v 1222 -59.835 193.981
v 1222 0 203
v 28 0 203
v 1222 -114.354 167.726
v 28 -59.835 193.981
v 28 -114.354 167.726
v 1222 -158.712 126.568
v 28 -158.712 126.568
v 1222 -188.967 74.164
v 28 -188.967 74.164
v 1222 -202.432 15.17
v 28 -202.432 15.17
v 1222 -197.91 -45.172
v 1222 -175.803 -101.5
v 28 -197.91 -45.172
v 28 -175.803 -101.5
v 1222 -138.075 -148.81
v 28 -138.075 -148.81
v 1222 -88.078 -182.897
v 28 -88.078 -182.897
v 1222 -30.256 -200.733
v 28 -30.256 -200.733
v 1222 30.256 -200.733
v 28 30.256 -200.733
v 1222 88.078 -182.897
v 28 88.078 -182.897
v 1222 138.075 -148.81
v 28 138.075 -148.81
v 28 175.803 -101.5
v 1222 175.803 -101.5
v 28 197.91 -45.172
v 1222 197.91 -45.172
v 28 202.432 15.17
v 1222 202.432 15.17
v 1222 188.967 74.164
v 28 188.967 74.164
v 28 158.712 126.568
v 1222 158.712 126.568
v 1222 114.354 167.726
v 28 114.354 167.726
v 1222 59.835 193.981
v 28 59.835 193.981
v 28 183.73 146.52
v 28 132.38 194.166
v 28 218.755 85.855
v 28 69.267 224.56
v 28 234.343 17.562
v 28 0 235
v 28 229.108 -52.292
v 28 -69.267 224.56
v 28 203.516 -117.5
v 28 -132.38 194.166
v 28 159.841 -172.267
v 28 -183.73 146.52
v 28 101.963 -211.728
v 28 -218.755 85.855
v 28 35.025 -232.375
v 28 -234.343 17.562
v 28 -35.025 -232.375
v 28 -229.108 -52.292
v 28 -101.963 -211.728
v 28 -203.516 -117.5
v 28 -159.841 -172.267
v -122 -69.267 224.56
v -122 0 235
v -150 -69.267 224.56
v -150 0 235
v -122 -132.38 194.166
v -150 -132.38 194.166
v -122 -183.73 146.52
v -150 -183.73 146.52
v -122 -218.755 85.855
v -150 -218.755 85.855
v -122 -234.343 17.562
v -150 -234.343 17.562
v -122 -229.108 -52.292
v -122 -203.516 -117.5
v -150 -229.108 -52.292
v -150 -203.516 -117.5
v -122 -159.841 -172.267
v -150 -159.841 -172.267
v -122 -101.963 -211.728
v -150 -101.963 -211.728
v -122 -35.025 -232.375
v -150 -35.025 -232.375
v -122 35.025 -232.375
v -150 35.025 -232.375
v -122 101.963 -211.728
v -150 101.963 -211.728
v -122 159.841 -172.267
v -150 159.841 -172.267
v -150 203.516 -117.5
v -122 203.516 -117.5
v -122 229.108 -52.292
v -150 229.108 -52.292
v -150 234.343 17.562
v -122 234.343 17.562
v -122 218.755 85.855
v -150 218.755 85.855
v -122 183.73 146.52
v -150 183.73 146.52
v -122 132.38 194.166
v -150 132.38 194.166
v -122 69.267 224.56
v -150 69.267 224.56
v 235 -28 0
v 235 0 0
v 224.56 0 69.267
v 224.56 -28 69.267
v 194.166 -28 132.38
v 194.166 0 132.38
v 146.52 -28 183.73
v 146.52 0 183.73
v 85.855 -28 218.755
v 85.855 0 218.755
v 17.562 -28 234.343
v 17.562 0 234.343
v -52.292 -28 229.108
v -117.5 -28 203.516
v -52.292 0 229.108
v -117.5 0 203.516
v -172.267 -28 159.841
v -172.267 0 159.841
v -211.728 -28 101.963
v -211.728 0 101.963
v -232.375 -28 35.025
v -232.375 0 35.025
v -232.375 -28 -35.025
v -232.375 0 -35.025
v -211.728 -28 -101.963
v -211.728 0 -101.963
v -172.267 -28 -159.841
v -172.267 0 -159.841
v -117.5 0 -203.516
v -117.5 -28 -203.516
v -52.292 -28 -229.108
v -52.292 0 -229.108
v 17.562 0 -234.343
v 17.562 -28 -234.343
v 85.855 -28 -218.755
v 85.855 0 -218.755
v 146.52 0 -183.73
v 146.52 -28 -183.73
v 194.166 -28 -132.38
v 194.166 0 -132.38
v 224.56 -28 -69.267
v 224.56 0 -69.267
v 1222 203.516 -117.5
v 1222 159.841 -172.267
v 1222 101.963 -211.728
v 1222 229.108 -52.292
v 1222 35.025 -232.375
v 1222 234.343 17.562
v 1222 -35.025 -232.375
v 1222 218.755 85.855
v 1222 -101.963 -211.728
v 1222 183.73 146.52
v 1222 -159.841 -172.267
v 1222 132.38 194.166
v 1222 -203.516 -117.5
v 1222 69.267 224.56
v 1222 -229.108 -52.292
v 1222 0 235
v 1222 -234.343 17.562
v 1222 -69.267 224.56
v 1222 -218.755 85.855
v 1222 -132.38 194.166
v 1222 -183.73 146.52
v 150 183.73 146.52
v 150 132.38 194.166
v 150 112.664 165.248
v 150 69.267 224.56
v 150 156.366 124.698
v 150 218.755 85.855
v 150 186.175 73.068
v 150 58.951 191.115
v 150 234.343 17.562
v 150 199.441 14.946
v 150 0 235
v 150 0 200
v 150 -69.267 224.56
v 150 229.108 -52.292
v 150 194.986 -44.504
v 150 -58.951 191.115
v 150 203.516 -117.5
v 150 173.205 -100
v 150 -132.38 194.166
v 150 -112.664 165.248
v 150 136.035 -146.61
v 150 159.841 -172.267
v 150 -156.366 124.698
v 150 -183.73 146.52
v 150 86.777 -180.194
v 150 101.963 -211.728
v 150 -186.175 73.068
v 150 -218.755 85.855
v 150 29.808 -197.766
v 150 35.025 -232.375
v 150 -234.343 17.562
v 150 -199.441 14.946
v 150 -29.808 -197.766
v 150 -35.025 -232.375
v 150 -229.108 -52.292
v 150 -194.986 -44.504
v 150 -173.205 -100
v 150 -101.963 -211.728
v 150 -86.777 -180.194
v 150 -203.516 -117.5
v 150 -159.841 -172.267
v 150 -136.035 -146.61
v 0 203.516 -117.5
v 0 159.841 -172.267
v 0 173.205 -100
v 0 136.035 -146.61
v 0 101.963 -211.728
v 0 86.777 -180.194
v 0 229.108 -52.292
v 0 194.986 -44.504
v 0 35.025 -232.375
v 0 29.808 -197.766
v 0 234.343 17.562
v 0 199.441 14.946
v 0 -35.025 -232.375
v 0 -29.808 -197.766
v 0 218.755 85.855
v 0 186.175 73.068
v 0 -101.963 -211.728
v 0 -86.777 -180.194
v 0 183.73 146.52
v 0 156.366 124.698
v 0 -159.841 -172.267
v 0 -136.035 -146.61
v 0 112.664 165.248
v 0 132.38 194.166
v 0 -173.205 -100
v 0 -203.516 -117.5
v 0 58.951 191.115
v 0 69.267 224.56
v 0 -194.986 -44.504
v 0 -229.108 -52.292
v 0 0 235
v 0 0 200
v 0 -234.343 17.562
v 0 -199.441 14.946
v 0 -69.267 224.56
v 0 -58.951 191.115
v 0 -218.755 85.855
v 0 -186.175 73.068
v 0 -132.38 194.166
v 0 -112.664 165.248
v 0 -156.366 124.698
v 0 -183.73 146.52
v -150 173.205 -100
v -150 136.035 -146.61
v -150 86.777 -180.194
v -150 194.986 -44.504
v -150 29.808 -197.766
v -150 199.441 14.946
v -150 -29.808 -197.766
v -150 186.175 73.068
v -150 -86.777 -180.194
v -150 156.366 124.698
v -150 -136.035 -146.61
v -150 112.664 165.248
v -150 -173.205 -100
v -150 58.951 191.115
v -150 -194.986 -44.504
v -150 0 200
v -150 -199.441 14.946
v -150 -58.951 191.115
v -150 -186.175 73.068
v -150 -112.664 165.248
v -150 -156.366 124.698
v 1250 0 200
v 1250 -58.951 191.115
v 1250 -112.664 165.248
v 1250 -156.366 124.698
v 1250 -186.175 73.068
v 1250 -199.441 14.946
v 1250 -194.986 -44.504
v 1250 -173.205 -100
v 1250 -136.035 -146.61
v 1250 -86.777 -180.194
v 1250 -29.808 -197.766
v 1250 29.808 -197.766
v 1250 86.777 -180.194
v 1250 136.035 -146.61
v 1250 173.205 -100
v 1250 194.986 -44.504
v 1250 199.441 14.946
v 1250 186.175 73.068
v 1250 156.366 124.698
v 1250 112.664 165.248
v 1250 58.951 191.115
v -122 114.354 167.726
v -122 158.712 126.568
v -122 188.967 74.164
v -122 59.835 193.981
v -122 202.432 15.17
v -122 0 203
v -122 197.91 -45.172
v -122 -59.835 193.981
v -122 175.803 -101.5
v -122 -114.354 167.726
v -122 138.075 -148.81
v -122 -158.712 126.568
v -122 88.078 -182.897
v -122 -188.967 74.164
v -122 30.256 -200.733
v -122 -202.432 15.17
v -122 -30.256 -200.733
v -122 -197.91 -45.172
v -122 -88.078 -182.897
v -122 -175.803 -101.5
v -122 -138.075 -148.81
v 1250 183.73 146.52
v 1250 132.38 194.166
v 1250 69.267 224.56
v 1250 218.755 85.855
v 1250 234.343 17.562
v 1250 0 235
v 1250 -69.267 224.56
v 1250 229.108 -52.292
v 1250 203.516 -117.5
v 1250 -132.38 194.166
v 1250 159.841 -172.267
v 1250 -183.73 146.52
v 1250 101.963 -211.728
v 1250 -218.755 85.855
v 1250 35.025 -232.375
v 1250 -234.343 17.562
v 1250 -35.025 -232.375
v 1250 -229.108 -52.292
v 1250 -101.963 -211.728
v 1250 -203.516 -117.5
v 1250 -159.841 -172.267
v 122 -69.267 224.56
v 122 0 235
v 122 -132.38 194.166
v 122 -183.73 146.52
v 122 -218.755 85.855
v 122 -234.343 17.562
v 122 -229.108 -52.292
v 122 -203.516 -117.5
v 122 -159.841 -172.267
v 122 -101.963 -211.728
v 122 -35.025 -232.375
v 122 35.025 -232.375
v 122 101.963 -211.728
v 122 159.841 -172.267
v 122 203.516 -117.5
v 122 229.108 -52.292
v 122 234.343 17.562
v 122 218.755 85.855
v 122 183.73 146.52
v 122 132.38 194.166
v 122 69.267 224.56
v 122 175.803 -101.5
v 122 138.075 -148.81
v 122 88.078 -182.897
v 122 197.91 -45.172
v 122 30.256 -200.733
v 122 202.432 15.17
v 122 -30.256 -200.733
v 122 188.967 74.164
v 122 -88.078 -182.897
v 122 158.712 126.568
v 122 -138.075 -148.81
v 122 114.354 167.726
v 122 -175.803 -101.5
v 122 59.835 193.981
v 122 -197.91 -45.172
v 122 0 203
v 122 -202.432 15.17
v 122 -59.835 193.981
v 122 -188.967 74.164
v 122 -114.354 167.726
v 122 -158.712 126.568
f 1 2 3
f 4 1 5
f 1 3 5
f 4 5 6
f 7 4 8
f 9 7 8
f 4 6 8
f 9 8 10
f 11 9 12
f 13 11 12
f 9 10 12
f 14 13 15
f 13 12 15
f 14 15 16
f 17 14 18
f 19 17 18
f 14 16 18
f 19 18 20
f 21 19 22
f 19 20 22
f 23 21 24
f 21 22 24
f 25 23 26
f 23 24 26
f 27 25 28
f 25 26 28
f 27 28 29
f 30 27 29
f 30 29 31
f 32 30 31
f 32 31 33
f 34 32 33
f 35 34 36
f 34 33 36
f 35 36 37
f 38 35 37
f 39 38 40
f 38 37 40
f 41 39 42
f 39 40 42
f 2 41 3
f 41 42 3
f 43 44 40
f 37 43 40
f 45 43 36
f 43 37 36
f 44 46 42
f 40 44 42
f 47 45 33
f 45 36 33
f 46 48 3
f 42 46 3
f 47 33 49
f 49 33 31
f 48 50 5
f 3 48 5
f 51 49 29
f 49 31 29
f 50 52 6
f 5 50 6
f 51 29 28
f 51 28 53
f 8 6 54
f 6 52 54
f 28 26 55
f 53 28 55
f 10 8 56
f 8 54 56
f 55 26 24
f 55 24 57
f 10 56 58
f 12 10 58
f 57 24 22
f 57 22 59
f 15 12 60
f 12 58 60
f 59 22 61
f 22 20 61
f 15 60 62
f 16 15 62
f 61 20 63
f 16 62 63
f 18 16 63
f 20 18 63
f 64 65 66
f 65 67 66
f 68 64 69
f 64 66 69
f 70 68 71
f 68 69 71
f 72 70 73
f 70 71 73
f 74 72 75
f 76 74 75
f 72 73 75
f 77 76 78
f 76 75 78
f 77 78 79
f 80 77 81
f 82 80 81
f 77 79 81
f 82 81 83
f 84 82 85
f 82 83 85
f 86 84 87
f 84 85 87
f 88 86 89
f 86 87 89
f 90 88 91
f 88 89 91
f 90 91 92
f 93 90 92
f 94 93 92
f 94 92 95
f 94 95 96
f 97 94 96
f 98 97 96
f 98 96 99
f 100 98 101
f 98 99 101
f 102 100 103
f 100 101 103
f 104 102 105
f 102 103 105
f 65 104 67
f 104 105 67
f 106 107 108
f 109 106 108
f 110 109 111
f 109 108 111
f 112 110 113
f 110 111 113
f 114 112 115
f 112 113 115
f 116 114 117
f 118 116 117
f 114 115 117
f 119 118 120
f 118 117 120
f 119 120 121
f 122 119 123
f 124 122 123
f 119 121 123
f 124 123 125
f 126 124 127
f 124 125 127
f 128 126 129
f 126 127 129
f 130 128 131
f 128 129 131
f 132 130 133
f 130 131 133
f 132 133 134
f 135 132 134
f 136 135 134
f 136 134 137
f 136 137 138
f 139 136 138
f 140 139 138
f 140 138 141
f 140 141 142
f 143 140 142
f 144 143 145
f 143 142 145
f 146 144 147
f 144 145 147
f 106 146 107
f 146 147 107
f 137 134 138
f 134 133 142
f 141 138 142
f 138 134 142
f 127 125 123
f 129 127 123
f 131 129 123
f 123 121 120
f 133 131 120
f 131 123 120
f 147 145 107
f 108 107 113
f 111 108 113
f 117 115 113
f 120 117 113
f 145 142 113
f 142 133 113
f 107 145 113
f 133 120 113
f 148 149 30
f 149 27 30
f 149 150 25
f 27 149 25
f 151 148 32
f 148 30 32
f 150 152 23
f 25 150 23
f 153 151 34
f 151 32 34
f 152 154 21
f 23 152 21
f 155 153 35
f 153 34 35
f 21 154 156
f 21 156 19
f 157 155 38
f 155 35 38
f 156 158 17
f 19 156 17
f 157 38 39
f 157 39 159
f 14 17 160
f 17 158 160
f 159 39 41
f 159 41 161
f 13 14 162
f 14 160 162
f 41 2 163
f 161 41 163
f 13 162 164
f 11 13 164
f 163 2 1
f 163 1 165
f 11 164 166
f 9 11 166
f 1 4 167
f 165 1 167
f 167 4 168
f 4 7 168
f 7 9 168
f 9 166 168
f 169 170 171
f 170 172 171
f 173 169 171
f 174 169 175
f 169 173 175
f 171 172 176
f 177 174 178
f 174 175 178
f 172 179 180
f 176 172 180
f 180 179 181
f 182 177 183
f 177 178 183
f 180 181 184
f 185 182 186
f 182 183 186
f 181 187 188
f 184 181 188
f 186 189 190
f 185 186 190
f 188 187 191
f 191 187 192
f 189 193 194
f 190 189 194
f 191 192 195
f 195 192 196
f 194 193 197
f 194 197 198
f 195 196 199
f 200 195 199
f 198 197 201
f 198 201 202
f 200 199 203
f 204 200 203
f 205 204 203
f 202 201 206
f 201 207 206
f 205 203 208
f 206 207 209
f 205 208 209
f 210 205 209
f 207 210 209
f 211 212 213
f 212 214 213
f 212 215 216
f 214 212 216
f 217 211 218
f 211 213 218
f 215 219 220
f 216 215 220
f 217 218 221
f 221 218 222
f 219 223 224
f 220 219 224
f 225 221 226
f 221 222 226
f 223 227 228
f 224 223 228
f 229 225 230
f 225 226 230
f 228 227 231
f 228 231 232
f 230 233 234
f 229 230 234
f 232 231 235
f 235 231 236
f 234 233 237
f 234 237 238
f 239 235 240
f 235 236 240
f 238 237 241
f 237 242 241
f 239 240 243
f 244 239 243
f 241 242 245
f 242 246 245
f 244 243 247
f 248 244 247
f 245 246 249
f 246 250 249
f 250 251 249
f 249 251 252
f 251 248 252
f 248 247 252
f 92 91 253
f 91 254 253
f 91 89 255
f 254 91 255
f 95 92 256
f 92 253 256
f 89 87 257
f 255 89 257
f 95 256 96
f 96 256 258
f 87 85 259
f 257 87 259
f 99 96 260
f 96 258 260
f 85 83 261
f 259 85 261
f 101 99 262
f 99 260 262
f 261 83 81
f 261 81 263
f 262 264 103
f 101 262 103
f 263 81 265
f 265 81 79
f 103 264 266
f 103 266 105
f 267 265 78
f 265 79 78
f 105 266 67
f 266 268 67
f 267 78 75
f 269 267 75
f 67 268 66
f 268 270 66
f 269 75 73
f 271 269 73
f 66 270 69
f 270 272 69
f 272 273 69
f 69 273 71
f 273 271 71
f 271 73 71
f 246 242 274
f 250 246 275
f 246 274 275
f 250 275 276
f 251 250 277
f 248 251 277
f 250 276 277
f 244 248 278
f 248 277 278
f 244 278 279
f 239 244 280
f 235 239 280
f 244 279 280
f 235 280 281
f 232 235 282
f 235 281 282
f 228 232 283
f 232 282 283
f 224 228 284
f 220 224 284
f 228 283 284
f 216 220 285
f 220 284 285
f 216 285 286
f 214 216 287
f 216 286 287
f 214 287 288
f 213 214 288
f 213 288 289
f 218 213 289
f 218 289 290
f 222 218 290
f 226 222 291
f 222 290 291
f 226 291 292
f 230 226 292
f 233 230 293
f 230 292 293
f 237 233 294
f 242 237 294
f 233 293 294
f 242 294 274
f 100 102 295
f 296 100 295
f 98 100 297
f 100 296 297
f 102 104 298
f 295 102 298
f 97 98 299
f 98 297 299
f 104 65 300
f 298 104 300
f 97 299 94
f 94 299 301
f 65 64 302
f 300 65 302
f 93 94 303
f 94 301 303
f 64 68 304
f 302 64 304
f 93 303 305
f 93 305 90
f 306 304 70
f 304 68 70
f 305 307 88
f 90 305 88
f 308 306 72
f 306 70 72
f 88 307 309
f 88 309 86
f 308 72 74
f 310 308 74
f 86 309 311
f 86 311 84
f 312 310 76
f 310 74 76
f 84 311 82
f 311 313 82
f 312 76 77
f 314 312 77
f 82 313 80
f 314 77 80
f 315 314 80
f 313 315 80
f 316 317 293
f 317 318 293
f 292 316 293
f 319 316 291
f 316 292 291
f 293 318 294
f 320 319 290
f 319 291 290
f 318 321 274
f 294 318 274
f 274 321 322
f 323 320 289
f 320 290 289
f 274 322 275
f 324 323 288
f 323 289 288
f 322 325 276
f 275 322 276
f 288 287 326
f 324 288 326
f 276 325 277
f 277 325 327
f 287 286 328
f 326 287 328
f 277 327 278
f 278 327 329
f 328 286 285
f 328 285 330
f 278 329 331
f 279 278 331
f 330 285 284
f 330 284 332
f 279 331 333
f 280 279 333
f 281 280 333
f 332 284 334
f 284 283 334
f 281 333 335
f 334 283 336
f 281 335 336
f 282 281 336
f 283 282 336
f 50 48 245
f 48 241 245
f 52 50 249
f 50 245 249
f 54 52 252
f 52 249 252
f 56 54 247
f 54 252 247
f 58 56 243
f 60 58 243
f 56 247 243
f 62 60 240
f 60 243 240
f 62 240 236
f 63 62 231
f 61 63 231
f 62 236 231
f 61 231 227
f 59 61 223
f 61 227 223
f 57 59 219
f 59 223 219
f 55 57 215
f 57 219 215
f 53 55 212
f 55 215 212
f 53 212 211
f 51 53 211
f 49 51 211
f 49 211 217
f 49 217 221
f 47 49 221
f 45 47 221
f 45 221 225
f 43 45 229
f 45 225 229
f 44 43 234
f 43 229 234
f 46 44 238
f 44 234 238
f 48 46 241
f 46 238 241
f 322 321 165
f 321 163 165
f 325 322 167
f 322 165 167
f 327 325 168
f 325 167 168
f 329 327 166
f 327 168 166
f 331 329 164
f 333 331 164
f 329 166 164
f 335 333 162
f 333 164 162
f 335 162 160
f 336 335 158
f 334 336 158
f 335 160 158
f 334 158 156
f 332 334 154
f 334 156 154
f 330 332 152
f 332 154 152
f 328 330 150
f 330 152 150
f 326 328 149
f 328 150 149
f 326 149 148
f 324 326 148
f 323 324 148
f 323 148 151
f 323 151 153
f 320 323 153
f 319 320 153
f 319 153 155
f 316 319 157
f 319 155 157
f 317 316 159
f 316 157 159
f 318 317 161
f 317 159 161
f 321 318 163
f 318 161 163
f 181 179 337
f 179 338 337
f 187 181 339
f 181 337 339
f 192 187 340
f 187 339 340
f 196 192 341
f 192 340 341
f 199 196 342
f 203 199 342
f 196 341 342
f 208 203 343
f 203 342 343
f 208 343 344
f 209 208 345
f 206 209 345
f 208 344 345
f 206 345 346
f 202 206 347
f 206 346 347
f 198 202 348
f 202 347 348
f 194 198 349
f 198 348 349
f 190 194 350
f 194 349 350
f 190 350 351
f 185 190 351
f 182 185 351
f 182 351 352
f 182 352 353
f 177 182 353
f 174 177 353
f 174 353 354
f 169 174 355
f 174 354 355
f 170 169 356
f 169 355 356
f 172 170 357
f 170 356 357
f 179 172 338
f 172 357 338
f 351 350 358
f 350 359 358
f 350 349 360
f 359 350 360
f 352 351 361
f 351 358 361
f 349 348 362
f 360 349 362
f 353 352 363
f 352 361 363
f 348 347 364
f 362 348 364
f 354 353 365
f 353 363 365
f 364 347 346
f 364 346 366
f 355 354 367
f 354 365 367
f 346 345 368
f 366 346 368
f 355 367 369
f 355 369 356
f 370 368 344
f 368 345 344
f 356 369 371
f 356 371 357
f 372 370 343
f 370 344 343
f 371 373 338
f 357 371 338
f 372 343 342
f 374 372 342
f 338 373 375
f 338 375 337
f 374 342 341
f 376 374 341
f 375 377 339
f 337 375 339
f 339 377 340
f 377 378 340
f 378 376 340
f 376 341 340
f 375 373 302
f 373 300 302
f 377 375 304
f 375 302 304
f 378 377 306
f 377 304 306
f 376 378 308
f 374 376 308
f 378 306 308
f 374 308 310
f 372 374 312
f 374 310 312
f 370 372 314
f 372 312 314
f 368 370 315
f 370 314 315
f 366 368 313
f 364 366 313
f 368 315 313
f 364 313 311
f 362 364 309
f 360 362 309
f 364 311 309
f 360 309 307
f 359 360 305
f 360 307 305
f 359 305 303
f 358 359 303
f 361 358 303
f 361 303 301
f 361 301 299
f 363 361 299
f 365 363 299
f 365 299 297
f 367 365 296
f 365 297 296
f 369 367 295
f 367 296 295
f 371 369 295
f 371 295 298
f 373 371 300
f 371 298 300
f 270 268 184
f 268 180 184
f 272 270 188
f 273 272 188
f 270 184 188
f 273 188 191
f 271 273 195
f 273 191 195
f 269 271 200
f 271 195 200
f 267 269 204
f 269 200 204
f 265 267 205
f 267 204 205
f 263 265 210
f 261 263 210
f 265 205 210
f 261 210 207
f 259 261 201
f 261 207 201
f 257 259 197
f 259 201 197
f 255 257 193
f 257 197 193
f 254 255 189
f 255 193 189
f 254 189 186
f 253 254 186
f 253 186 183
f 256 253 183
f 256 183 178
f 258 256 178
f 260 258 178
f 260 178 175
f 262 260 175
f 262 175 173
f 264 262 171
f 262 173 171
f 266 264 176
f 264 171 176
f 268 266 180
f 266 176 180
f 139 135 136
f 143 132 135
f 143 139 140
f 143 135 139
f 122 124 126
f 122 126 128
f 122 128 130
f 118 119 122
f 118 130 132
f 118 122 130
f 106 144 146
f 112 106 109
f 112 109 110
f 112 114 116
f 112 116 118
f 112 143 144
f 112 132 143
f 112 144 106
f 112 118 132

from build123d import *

# Parameters (mm, degrees)
F6_R     = 235
F7_DEPTH = 28


with BuildPart() as f2:
    # F0 (on Front) → F2 (revolve)
    with BuildSketch(Plane.XZ):
        Polygon((0, 235), (0, 200), (1250, 200), (1250, 235), (1222, 235), (1222, 203), (28, 203), (28, 235), align=None)
    revolve(axis=Axis((-36.346368, 0, 0), (1, 0, 0)))


with BuildPart() as f5:
    # F4 (on Front) → F5 (revolve)
    with BuildSketch(Plane.XZ):
        Polygon((-150, 235), (-150, 200), (150, 200), (150, 235), (122, 235), (122, 203), (-122, 203), (-122, 235), align=None)
    revolve(axis=Axis((-36.346368, 0, 0), (1, 0, 0)))


with BuildPart() as f7:
    # F6 (on Front) → F7 (new body)
    with BuildSketch(Plane.XZ):
        Circle(F6_R)
    extrude(amount=F7_DEPTH)


solid = Compound([f2.part, f5.part, f7.part])
